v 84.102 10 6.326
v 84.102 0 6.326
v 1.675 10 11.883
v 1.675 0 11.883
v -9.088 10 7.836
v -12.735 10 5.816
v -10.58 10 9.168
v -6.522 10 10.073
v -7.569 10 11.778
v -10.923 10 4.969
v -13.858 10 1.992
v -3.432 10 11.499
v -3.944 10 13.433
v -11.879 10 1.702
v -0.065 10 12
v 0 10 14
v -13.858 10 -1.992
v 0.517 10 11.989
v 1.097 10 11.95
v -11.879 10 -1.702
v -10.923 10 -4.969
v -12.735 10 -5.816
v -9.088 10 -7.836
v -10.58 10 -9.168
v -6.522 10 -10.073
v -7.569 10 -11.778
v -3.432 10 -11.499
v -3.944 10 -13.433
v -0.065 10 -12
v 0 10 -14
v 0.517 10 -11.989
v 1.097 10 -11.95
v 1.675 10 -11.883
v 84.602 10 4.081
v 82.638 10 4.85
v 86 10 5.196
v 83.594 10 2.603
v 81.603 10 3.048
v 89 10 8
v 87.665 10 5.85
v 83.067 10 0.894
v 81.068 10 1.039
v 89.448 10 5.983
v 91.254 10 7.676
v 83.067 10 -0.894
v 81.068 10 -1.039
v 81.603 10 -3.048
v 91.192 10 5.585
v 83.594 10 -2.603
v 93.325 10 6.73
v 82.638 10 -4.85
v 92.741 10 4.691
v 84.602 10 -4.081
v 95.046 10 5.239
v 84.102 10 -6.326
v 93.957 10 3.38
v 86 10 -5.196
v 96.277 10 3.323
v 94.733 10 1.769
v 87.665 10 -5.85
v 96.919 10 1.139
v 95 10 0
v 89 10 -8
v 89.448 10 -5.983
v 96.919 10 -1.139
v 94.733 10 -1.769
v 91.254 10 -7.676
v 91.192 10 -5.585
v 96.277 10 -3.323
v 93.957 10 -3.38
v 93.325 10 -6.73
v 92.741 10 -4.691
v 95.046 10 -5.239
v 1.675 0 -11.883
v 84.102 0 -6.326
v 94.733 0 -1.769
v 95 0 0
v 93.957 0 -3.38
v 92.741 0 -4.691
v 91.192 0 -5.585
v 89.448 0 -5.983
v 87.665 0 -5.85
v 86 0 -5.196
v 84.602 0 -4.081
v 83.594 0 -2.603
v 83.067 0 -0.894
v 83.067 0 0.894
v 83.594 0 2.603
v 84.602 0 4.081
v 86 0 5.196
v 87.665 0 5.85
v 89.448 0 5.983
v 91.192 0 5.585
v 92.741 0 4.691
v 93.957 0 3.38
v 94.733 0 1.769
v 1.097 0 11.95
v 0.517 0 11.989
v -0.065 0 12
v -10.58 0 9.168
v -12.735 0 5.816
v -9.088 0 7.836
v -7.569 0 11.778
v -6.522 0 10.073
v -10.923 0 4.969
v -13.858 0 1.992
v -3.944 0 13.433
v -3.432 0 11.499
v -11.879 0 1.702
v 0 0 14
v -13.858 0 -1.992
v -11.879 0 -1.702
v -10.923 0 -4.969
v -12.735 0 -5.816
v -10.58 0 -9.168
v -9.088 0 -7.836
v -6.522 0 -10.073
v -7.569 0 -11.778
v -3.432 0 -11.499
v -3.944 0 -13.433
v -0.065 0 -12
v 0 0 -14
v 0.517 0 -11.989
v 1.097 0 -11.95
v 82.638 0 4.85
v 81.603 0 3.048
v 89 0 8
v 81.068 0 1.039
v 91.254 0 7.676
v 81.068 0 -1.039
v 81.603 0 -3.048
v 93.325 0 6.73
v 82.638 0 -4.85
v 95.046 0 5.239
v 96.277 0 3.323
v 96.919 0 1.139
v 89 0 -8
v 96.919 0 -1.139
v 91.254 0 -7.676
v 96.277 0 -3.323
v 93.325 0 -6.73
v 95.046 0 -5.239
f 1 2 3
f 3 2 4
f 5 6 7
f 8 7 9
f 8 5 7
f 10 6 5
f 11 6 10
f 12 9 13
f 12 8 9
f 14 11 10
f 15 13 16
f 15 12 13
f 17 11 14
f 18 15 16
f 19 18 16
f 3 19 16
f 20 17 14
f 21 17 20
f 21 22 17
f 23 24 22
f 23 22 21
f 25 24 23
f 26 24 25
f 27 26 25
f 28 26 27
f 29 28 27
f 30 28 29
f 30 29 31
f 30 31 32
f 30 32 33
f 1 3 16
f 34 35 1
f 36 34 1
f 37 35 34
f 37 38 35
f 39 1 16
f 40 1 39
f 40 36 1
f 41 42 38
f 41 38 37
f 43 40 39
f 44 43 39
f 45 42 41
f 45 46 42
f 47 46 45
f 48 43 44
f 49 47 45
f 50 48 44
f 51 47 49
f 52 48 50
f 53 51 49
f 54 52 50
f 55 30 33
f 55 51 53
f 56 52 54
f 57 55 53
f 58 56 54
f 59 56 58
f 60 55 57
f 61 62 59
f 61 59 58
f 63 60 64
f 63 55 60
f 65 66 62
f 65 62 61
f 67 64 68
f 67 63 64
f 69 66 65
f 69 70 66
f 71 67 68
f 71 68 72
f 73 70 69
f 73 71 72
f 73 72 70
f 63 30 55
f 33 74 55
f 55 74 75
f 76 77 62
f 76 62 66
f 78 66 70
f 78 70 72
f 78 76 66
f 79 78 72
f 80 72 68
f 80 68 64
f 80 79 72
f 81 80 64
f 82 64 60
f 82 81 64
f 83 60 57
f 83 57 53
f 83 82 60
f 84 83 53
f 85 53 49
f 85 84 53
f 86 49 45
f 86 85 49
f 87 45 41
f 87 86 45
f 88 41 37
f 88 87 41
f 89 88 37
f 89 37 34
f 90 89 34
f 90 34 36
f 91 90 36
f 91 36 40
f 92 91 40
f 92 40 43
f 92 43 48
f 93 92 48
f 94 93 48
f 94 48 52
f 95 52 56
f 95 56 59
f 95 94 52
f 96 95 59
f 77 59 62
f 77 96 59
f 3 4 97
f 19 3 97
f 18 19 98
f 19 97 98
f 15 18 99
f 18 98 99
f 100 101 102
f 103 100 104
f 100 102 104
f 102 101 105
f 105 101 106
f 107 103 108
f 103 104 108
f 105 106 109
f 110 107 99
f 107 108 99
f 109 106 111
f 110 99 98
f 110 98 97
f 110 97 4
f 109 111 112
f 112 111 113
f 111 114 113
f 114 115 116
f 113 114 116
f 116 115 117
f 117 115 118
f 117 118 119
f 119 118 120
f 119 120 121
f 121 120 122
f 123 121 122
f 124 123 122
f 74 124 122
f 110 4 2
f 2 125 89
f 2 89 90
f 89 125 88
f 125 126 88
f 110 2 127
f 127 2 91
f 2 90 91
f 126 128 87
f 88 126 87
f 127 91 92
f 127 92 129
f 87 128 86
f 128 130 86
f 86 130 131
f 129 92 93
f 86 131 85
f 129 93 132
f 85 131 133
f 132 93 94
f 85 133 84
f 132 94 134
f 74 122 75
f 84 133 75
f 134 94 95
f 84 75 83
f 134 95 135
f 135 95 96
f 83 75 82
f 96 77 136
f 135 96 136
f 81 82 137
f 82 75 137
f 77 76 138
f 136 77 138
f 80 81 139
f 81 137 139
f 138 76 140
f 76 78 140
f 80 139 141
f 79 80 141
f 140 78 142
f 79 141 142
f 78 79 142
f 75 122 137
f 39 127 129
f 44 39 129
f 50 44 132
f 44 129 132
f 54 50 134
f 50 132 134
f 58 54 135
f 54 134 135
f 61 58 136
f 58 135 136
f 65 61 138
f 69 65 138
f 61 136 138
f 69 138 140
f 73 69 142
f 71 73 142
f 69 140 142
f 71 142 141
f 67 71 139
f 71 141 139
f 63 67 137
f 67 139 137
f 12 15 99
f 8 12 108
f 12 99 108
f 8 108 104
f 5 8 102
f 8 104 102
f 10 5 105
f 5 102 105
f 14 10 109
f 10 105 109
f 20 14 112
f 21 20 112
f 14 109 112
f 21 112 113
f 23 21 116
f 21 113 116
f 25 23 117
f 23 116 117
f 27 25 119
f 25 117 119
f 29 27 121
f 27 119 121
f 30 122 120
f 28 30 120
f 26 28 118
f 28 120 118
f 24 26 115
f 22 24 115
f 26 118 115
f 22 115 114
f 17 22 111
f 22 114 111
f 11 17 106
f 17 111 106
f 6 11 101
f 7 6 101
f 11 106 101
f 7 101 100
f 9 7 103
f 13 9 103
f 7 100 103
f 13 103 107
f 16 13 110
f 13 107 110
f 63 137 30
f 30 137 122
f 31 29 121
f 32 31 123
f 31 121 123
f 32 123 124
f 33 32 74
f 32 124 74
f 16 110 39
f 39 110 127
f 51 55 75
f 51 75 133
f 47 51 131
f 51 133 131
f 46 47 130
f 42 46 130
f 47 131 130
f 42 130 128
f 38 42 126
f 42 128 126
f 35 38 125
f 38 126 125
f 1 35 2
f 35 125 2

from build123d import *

# Parameters (mm, degrees)
SKETCH1_R           = 6
BOSS_EXTRUDE1_DEPTH = 10


with BuildPart() as part:
    # Sketch1 → Boss-Extrude1 (new body)
    with BuildSketch(Plane(origin=(0, 0, 0), x_dir=(1, 0, 0), z_dir=(0, 1, 0))):
        with BuildLine():
            ThreePointArc((0, 14), (-14, 0), (0, -14))
            Line((0, -14), (89, -8))
            ThreePointArc((89, -8), (97, 0), (89, 8))
            Line((89, 8), (0, 14))
        make_face()
        with BuildLine():
            ThreePointArc((1.674796148, -11.882552666), (0.807156628, -11.972823317), (-0.064748194, -11.999825318))
            ThreePointArc((-0.064748194, -11.999825318), (-12, 0), (-0.064748194, 11.999825318))
            ThreePointArc((-0.064748194, 11.999825318), (0.807156628, 11.972823317), (1.674796148, 11.882552666))
            Line((1.674796148, 11.882552666), (84.102414172, 6.325634597))
            ThreePointArc((84.102414172, 6.325634597), (81, 0), (84.102414172, -6.325634597))
            Line((84.102414172, -6.325634597), (1.674796148, -11.882552666))
        make_face(mode=Mode.SUBTRACT)
        with Locations((89, 0)):
            Circle(SKETCH1_R, mode=Mode.SUBTRACT)
    extrude(amount=BOSS_EXTRUDE1_DEPTH)


solid = part.part
